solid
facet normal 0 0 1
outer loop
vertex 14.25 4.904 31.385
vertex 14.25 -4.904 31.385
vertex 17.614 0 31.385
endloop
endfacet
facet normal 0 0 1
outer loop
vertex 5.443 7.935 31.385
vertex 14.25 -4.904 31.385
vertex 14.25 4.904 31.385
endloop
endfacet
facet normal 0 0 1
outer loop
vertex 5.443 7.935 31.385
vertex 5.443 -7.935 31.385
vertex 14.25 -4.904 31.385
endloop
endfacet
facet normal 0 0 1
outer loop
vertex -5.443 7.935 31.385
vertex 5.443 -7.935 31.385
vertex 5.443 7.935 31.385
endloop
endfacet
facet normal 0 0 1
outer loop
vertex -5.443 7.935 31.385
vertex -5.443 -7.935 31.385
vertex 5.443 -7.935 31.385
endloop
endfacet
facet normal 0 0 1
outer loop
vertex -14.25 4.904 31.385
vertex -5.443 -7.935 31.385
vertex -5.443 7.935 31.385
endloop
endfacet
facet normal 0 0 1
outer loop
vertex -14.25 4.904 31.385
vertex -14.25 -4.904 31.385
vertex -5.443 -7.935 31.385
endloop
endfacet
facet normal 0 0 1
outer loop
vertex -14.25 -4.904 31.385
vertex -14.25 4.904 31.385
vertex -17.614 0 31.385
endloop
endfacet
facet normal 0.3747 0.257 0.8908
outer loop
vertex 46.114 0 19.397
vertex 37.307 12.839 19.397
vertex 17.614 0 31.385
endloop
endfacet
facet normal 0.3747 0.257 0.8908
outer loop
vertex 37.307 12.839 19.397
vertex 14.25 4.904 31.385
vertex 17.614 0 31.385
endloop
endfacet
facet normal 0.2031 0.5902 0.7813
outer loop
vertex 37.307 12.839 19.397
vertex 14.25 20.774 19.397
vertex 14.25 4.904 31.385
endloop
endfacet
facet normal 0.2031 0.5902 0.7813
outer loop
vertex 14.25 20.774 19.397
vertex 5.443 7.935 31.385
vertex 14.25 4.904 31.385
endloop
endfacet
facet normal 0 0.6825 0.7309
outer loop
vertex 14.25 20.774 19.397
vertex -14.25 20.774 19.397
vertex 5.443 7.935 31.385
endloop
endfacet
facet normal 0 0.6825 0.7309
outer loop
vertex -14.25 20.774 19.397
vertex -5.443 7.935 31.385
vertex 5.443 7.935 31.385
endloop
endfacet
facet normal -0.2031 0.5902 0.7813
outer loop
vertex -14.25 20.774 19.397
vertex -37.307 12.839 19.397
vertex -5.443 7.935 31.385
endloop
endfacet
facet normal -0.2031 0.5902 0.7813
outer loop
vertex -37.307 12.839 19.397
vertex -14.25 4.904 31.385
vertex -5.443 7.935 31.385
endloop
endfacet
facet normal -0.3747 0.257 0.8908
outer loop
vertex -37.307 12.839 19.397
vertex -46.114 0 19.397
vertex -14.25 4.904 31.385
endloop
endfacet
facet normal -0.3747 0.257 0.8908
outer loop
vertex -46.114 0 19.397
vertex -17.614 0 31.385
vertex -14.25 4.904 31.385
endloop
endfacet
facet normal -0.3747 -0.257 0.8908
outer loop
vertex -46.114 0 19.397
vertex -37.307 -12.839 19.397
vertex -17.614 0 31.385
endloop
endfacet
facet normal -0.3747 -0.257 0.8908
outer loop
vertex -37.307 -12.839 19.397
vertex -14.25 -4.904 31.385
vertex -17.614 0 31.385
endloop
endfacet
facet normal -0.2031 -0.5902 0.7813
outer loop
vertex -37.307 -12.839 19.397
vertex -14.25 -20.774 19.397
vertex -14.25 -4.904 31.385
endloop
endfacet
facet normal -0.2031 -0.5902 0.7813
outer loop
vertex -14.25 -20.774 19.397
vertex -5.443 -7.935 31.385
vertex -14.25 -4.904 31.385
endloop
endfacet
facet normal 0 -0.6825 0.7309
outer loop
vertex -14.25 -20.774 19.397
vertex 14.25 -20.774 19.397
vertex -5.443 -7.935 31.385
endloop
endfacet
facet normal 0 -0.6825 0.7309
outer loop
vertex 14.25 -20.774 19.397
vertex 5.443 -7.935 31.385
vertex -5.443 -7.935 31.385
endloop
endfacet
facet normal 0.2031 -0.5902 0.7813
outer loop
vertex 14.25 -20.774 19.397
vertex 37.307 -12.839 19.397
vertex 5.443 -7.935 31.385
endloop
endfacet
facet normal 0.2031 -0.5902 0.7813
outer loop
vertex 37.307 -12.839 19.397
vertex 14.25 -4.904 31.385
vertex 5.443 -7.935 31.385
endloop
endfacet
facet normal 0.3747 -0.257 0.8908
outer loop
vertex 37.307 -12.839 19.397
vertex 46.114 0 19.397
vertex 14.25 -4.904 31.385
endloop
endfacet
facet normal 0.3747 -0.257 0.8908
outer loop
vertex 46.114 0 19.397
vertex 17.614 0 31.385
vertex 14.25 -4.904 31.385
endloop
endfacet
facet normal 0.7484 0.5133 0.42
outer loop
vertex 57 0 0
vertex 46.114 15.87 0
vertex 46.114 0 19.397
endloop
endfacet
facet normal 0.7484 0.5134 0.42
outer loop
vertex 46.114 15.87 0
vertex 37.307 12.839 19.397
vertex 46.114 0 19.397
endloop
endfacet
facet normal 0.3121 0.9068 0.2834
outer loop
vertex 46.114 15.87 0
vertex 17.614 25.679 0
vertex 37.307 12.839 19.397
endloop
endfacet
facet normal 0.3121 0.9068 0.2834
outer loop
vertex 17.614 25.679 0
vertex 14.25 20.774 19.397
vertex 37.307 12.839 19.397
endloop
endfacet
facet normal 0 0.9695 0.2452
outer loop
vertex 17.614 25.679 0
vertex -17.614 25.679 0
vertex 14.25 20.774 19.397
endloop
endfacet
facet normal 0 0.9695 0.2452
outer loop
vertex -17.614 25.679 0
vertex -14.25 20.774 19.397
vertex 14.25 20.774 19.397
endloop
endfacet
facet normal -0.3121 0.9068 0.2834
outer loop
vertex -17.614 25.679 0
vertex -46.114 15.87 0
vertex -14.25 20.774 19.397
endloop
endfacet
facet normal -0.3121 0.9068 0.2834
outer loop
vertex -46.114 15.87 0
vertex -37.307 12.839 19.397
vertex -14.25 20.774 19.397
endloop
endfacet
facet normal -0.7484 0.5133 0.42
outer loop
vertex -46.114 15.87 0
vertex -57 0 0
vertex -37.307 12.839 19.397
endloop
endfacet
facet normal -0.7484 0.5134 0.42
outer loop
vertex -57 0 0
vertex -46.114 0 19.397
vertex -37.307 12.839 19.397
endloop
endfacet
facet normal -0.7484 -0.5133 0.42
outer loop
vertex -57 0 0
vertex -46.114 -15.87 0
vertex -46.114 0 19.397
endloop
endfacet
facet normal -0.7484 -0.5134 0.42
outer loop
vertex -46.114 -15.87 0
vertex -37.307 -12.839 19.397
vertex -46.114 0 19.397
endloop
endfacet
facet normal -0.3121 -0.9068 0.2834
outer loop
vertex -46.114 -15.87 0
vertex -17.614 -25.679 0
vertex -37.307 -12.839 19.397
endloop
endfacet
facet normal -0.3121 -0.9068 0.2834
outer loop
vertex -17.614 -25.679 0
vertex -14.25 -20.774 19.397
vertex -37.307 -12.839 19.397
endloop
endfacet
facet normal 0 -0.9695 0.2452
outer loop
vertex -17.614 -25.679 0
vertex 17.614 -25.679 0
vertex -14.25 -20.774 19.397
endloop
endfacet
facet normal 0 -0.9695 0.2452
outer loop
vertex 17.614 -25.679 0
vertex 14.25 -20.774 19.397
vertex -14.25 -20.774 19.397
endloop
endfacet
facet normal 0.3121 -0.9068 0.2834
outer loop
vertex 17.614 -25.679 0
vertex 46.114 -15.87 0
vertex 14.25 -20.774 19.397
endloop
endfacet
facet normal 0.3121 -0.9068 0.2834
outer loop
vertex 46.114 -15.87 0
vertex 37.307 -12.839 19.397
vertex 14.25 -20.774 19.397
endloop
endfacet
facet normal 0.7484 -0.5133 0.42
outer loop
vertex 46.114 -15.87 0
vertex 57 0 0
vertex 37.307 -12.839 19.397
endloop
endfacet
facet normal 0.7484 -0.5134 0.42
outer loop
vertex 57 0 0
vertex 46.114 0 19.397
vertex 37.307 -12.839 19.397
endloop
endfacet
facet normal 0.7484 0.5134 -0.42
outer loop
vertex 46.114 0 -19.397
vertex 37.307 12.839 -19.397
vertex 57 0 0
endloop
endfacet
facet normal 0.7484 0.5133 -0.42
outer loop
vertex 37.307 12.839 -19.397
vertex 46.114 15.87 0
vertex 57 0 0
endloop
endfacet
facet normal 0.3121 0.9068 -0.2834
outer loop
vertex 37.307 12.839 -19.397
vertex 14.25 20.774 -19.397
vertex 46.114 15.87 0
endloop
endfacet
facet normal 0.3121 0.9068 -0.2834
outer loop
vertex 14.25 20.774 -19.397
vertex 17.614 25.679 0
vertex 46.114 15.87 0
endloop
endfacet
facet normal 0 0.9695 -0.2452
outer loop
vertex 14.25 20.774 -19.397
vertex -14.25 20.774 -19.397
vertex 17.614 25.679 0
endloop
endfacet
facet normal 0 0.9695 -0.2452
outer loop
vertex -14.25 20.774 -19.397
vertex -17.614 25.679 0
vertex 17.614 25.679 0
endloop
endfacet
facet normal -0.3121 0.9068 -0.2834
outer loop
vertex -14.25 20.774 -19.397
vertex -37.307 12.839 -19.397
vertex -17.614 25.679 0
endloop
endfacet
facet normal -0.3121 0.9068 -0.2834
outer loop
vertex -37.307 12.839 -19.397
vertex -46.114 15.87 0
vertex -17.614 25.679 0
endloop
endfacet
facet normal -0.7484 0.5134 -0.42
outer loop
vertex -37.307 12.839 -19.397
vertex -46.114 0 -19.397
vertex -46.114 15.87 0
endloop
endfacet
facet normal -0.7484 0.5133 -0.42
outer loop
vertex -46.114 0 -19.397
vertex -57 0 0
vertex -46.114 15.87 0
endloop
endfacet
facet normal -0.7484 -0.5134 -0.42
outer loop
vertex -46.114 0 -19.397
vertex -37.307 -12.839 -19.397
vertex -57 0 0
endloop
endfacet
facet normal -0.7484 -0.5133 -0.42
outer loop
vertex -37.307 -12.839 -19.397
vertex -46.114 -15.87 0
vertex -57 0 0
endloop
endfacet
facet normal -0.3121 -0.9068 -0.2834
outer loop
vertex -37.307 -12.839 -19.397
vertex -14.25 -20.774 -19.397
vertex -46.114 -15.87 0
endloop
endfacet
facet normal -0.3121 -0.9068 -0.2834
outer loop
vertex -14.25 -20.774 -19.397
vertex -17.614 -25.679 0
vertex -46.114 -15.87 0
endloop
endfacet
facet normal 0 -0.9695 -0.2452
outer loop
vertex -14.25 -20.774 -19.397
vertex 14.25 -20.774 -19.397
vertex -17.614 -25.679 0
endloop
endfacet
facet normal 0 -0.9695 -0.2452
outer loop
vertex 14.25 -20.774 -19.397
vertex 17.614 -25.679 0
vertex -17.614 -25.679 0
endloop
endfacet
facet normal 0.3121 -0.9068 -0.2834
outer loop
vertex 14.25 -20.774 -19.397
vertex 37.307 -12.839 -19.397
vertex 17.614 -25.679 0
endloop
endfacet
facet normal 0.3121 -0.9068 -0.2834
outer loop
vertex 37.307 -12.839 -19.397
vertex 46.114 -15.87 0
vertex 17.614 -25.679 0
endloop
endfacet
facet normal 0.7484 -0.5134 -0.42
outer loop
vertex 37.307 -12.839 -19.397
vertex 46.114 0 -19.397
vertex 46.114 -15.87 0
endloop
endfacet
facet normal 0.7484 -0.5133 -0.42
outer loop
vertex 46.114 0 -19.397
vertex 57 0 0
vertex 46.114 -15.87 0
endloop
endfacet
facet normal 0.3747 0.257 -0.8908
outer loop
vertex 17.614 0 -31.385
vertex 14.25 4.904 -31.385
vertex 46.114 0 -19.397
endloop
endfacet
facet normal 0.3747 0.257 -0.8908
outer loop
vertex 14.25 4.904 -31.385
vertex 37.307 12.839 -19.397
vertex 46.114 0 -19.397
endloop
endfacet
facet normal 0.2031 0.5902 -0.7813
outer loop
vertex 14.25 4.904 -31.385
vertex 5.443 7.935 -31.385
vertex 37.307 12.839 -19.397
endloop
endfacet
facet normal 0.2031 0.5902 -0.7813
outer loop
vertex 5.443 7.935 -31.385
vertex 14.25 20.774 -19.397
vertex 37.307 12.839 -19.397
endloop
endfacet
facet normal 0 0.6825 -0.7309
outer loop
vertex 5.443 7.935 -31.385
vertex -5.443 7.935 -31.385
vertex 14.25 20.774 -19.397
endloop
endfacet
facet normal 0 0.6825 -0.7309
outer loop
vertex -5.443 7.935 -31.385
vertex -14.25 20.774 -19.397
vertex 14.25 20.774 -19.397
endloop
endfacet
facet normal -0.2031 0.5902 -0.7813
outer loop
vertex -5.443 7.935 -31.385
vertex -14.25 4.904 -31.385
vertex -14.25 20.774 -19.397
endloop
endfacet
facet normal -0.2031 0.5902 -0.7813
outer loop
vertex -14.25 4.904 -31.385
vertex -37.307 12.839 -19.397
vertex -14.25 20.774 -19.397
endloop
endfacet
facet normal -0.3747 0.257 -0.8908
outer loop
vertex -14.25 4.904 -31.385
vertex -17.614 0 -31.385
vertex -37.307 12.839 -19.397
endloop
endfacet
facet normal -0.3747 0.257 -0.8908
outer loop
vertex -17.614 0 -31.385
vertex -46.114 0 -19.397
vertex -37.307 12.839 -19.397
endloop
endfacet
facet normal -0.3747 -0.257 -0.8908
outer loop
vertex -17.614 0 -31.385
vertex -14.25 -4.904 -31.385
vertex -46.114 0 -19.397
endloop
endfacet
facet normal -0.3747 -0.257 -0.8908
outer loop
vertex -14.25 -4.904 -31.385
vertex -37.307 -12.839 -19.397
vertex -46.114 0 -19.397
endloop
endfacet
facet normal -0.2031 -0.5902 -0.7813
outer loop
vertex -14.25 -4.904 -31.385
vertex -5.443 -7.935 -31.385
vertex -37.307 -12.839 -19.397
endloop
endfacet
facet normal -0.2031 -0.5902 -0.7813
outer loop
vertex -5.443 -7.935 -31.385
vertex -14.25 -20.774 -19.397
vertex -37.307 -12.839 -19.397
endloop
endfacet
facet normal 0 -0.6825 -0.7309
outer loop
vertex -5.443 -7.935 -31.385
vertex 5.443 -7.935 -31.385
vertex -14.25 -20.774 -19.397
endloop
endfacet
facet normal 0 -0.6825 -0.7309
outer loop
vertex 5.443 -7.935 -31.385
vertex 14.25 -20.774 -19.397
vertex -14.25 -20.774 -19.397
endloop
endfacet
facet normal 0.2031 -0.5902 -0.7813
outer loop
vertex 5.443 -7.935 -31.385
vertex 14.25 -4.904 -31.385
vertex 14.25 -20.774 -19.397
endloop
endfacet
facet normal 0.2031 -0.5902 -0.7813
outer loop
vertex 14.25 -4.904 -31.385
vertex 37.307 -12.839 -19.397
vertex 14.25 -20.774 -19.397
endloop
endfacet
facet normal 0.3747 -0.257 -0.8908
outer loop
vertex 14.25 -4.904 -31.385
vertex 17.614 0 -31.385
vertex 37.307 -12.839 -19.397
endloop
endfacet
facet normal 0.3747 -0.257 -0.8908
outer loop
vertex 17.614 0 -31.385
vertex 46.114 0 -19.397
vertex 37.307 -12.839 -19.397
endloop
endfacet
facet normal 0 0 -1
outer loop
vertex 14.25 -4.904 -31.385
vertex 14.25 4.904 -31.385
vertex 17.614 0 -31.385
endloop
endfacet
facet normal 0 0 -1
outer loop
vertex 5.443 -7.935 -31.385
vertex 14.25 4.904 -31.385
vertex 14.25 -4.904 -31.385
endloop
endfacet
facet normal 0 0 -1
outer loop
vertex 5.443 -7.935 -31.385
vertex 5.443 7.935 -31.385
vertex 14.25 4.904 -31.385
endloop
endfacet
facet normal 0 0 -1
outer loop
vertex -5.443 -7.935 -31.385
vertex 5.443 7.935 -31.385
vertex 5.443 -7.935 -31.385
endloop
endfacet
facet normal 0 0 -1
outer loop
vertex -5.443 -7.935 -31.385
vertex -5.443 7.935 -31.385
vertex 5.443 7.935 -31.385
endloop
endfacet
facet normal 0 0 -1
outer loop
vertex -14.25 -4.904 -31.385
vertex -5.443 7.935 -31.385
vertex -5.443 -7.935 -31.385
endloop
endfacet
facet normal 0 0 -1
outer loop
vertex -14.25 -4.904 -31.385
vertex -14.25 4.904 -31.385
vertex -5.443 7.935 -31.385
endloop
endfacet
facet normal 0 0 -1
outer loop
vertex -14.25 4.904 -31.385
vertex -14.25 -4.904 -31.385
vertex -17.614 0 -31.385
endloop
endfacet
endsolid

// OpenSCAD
// Generated by SolidPython 1.0.1 on 2020-07-29 00:46:54


scale(v = [19, 9, 11]) {
	sphere(r = 3);
}
/***********************************************
*********      SolidPython code:      **********
************************************************
 
# import packages: SolidPython
from solid import *
from solid.utils import *
from itertools import chain, combinations, permutations


class Resize:

    def __init__(self, scad_file):
        self.scad_file = scad_file
        #self.scad_file = import_scad(scad_file)
        # cone/cylinder param:
        self.r1 = 0
        self.r2 = 0
        self.h = 0
        # rectangular prism param:
        self.w = 0
        self.l = 0
        # ellipse param:
        self.r = 0

    # import OpenScad code (file name corresponds to shape)


    # classify shape + parameters
    def assign(self, param1, param2, param3):
        if self.scad_file == 'cone.scad':
            self.r1 = param1
            self.r2 = param2
            self.h = param3
        elif self.scad_file == 'cylinder.scad':
            self.r1 = param1
            self.r2 = param2
            self.h = param3
        elif self.scad_file == 'rectangularPrism.scad':
            self.h = param1
            self.l = param2
            self.w = param3
        else:
            self.r = param1
            self.h = param2

    # resize parameters
    def iterate(self):
        x = range(3, 20, 2)
        i = 1
        if self.scad_file == 'cone.scad':
            tempList = list(permutations(x, 2))
            for temp in tempList:
                param1 = temp[0]
                param2 = temp[1]
                filepath = 'produced_scad_files/' + 'cone' + str(param1) + '_' + str(param2) + '_' + '.scad'
                scad_render_to_file(cylinder(h=param1, r1=param2, r2=0), filepath)

        elif self.scad_file == 'cylinder.scad':
            tempList = list(permutations(x, 3))
            for temp in tempList:
                param1 = temp[0]
                param2 = temp[1]
                filepath = 'produced_scad_files/' + 'cylinder' + str(param1) + '_' + str(param2) + '_' + '.scad'
                scad_render_to_file(cylinder(h=param1, r1=param2, r2=param2), filepath)

        elif self.scad_file == 'rectangularPrism.scad':
            tempList = list(permutations(x, 3))
            for temp in tempList:
                param1 = temp[0]
                param2 = temp[1]
                param3 = temp[2]
                filepath = 'produced_scad_files/' + 'rectangularPrism' + str(param1) + '_' + str(param2) + '_' + str(
                    param3) + '.scad'
                scad_render_to_file(cube(size=(param1, param2, param3)), filepath)

        elif self.scad_file == 'ellipse.scad':
            tempList = list(permutations(x, 4))
            for temp in tempList:
                param1 = temp[0]
                param2 = temp[1]
                param3 = temp[2]
                param4 = temp[3]
                filepath = 'produced_scad_files/' + 'ellipse' + str(param1) + '_' + str(param2) + '_' + str(param3) + '_' + str(param4) + '.scad'
                scad_render_to_file(scale([param1, param2, param3])(sphere(r=param4)), filepath)

    def render_to_scadfile(self):
        scad_render_to_file(scad, 'example.scad') 
 
************************************************/
